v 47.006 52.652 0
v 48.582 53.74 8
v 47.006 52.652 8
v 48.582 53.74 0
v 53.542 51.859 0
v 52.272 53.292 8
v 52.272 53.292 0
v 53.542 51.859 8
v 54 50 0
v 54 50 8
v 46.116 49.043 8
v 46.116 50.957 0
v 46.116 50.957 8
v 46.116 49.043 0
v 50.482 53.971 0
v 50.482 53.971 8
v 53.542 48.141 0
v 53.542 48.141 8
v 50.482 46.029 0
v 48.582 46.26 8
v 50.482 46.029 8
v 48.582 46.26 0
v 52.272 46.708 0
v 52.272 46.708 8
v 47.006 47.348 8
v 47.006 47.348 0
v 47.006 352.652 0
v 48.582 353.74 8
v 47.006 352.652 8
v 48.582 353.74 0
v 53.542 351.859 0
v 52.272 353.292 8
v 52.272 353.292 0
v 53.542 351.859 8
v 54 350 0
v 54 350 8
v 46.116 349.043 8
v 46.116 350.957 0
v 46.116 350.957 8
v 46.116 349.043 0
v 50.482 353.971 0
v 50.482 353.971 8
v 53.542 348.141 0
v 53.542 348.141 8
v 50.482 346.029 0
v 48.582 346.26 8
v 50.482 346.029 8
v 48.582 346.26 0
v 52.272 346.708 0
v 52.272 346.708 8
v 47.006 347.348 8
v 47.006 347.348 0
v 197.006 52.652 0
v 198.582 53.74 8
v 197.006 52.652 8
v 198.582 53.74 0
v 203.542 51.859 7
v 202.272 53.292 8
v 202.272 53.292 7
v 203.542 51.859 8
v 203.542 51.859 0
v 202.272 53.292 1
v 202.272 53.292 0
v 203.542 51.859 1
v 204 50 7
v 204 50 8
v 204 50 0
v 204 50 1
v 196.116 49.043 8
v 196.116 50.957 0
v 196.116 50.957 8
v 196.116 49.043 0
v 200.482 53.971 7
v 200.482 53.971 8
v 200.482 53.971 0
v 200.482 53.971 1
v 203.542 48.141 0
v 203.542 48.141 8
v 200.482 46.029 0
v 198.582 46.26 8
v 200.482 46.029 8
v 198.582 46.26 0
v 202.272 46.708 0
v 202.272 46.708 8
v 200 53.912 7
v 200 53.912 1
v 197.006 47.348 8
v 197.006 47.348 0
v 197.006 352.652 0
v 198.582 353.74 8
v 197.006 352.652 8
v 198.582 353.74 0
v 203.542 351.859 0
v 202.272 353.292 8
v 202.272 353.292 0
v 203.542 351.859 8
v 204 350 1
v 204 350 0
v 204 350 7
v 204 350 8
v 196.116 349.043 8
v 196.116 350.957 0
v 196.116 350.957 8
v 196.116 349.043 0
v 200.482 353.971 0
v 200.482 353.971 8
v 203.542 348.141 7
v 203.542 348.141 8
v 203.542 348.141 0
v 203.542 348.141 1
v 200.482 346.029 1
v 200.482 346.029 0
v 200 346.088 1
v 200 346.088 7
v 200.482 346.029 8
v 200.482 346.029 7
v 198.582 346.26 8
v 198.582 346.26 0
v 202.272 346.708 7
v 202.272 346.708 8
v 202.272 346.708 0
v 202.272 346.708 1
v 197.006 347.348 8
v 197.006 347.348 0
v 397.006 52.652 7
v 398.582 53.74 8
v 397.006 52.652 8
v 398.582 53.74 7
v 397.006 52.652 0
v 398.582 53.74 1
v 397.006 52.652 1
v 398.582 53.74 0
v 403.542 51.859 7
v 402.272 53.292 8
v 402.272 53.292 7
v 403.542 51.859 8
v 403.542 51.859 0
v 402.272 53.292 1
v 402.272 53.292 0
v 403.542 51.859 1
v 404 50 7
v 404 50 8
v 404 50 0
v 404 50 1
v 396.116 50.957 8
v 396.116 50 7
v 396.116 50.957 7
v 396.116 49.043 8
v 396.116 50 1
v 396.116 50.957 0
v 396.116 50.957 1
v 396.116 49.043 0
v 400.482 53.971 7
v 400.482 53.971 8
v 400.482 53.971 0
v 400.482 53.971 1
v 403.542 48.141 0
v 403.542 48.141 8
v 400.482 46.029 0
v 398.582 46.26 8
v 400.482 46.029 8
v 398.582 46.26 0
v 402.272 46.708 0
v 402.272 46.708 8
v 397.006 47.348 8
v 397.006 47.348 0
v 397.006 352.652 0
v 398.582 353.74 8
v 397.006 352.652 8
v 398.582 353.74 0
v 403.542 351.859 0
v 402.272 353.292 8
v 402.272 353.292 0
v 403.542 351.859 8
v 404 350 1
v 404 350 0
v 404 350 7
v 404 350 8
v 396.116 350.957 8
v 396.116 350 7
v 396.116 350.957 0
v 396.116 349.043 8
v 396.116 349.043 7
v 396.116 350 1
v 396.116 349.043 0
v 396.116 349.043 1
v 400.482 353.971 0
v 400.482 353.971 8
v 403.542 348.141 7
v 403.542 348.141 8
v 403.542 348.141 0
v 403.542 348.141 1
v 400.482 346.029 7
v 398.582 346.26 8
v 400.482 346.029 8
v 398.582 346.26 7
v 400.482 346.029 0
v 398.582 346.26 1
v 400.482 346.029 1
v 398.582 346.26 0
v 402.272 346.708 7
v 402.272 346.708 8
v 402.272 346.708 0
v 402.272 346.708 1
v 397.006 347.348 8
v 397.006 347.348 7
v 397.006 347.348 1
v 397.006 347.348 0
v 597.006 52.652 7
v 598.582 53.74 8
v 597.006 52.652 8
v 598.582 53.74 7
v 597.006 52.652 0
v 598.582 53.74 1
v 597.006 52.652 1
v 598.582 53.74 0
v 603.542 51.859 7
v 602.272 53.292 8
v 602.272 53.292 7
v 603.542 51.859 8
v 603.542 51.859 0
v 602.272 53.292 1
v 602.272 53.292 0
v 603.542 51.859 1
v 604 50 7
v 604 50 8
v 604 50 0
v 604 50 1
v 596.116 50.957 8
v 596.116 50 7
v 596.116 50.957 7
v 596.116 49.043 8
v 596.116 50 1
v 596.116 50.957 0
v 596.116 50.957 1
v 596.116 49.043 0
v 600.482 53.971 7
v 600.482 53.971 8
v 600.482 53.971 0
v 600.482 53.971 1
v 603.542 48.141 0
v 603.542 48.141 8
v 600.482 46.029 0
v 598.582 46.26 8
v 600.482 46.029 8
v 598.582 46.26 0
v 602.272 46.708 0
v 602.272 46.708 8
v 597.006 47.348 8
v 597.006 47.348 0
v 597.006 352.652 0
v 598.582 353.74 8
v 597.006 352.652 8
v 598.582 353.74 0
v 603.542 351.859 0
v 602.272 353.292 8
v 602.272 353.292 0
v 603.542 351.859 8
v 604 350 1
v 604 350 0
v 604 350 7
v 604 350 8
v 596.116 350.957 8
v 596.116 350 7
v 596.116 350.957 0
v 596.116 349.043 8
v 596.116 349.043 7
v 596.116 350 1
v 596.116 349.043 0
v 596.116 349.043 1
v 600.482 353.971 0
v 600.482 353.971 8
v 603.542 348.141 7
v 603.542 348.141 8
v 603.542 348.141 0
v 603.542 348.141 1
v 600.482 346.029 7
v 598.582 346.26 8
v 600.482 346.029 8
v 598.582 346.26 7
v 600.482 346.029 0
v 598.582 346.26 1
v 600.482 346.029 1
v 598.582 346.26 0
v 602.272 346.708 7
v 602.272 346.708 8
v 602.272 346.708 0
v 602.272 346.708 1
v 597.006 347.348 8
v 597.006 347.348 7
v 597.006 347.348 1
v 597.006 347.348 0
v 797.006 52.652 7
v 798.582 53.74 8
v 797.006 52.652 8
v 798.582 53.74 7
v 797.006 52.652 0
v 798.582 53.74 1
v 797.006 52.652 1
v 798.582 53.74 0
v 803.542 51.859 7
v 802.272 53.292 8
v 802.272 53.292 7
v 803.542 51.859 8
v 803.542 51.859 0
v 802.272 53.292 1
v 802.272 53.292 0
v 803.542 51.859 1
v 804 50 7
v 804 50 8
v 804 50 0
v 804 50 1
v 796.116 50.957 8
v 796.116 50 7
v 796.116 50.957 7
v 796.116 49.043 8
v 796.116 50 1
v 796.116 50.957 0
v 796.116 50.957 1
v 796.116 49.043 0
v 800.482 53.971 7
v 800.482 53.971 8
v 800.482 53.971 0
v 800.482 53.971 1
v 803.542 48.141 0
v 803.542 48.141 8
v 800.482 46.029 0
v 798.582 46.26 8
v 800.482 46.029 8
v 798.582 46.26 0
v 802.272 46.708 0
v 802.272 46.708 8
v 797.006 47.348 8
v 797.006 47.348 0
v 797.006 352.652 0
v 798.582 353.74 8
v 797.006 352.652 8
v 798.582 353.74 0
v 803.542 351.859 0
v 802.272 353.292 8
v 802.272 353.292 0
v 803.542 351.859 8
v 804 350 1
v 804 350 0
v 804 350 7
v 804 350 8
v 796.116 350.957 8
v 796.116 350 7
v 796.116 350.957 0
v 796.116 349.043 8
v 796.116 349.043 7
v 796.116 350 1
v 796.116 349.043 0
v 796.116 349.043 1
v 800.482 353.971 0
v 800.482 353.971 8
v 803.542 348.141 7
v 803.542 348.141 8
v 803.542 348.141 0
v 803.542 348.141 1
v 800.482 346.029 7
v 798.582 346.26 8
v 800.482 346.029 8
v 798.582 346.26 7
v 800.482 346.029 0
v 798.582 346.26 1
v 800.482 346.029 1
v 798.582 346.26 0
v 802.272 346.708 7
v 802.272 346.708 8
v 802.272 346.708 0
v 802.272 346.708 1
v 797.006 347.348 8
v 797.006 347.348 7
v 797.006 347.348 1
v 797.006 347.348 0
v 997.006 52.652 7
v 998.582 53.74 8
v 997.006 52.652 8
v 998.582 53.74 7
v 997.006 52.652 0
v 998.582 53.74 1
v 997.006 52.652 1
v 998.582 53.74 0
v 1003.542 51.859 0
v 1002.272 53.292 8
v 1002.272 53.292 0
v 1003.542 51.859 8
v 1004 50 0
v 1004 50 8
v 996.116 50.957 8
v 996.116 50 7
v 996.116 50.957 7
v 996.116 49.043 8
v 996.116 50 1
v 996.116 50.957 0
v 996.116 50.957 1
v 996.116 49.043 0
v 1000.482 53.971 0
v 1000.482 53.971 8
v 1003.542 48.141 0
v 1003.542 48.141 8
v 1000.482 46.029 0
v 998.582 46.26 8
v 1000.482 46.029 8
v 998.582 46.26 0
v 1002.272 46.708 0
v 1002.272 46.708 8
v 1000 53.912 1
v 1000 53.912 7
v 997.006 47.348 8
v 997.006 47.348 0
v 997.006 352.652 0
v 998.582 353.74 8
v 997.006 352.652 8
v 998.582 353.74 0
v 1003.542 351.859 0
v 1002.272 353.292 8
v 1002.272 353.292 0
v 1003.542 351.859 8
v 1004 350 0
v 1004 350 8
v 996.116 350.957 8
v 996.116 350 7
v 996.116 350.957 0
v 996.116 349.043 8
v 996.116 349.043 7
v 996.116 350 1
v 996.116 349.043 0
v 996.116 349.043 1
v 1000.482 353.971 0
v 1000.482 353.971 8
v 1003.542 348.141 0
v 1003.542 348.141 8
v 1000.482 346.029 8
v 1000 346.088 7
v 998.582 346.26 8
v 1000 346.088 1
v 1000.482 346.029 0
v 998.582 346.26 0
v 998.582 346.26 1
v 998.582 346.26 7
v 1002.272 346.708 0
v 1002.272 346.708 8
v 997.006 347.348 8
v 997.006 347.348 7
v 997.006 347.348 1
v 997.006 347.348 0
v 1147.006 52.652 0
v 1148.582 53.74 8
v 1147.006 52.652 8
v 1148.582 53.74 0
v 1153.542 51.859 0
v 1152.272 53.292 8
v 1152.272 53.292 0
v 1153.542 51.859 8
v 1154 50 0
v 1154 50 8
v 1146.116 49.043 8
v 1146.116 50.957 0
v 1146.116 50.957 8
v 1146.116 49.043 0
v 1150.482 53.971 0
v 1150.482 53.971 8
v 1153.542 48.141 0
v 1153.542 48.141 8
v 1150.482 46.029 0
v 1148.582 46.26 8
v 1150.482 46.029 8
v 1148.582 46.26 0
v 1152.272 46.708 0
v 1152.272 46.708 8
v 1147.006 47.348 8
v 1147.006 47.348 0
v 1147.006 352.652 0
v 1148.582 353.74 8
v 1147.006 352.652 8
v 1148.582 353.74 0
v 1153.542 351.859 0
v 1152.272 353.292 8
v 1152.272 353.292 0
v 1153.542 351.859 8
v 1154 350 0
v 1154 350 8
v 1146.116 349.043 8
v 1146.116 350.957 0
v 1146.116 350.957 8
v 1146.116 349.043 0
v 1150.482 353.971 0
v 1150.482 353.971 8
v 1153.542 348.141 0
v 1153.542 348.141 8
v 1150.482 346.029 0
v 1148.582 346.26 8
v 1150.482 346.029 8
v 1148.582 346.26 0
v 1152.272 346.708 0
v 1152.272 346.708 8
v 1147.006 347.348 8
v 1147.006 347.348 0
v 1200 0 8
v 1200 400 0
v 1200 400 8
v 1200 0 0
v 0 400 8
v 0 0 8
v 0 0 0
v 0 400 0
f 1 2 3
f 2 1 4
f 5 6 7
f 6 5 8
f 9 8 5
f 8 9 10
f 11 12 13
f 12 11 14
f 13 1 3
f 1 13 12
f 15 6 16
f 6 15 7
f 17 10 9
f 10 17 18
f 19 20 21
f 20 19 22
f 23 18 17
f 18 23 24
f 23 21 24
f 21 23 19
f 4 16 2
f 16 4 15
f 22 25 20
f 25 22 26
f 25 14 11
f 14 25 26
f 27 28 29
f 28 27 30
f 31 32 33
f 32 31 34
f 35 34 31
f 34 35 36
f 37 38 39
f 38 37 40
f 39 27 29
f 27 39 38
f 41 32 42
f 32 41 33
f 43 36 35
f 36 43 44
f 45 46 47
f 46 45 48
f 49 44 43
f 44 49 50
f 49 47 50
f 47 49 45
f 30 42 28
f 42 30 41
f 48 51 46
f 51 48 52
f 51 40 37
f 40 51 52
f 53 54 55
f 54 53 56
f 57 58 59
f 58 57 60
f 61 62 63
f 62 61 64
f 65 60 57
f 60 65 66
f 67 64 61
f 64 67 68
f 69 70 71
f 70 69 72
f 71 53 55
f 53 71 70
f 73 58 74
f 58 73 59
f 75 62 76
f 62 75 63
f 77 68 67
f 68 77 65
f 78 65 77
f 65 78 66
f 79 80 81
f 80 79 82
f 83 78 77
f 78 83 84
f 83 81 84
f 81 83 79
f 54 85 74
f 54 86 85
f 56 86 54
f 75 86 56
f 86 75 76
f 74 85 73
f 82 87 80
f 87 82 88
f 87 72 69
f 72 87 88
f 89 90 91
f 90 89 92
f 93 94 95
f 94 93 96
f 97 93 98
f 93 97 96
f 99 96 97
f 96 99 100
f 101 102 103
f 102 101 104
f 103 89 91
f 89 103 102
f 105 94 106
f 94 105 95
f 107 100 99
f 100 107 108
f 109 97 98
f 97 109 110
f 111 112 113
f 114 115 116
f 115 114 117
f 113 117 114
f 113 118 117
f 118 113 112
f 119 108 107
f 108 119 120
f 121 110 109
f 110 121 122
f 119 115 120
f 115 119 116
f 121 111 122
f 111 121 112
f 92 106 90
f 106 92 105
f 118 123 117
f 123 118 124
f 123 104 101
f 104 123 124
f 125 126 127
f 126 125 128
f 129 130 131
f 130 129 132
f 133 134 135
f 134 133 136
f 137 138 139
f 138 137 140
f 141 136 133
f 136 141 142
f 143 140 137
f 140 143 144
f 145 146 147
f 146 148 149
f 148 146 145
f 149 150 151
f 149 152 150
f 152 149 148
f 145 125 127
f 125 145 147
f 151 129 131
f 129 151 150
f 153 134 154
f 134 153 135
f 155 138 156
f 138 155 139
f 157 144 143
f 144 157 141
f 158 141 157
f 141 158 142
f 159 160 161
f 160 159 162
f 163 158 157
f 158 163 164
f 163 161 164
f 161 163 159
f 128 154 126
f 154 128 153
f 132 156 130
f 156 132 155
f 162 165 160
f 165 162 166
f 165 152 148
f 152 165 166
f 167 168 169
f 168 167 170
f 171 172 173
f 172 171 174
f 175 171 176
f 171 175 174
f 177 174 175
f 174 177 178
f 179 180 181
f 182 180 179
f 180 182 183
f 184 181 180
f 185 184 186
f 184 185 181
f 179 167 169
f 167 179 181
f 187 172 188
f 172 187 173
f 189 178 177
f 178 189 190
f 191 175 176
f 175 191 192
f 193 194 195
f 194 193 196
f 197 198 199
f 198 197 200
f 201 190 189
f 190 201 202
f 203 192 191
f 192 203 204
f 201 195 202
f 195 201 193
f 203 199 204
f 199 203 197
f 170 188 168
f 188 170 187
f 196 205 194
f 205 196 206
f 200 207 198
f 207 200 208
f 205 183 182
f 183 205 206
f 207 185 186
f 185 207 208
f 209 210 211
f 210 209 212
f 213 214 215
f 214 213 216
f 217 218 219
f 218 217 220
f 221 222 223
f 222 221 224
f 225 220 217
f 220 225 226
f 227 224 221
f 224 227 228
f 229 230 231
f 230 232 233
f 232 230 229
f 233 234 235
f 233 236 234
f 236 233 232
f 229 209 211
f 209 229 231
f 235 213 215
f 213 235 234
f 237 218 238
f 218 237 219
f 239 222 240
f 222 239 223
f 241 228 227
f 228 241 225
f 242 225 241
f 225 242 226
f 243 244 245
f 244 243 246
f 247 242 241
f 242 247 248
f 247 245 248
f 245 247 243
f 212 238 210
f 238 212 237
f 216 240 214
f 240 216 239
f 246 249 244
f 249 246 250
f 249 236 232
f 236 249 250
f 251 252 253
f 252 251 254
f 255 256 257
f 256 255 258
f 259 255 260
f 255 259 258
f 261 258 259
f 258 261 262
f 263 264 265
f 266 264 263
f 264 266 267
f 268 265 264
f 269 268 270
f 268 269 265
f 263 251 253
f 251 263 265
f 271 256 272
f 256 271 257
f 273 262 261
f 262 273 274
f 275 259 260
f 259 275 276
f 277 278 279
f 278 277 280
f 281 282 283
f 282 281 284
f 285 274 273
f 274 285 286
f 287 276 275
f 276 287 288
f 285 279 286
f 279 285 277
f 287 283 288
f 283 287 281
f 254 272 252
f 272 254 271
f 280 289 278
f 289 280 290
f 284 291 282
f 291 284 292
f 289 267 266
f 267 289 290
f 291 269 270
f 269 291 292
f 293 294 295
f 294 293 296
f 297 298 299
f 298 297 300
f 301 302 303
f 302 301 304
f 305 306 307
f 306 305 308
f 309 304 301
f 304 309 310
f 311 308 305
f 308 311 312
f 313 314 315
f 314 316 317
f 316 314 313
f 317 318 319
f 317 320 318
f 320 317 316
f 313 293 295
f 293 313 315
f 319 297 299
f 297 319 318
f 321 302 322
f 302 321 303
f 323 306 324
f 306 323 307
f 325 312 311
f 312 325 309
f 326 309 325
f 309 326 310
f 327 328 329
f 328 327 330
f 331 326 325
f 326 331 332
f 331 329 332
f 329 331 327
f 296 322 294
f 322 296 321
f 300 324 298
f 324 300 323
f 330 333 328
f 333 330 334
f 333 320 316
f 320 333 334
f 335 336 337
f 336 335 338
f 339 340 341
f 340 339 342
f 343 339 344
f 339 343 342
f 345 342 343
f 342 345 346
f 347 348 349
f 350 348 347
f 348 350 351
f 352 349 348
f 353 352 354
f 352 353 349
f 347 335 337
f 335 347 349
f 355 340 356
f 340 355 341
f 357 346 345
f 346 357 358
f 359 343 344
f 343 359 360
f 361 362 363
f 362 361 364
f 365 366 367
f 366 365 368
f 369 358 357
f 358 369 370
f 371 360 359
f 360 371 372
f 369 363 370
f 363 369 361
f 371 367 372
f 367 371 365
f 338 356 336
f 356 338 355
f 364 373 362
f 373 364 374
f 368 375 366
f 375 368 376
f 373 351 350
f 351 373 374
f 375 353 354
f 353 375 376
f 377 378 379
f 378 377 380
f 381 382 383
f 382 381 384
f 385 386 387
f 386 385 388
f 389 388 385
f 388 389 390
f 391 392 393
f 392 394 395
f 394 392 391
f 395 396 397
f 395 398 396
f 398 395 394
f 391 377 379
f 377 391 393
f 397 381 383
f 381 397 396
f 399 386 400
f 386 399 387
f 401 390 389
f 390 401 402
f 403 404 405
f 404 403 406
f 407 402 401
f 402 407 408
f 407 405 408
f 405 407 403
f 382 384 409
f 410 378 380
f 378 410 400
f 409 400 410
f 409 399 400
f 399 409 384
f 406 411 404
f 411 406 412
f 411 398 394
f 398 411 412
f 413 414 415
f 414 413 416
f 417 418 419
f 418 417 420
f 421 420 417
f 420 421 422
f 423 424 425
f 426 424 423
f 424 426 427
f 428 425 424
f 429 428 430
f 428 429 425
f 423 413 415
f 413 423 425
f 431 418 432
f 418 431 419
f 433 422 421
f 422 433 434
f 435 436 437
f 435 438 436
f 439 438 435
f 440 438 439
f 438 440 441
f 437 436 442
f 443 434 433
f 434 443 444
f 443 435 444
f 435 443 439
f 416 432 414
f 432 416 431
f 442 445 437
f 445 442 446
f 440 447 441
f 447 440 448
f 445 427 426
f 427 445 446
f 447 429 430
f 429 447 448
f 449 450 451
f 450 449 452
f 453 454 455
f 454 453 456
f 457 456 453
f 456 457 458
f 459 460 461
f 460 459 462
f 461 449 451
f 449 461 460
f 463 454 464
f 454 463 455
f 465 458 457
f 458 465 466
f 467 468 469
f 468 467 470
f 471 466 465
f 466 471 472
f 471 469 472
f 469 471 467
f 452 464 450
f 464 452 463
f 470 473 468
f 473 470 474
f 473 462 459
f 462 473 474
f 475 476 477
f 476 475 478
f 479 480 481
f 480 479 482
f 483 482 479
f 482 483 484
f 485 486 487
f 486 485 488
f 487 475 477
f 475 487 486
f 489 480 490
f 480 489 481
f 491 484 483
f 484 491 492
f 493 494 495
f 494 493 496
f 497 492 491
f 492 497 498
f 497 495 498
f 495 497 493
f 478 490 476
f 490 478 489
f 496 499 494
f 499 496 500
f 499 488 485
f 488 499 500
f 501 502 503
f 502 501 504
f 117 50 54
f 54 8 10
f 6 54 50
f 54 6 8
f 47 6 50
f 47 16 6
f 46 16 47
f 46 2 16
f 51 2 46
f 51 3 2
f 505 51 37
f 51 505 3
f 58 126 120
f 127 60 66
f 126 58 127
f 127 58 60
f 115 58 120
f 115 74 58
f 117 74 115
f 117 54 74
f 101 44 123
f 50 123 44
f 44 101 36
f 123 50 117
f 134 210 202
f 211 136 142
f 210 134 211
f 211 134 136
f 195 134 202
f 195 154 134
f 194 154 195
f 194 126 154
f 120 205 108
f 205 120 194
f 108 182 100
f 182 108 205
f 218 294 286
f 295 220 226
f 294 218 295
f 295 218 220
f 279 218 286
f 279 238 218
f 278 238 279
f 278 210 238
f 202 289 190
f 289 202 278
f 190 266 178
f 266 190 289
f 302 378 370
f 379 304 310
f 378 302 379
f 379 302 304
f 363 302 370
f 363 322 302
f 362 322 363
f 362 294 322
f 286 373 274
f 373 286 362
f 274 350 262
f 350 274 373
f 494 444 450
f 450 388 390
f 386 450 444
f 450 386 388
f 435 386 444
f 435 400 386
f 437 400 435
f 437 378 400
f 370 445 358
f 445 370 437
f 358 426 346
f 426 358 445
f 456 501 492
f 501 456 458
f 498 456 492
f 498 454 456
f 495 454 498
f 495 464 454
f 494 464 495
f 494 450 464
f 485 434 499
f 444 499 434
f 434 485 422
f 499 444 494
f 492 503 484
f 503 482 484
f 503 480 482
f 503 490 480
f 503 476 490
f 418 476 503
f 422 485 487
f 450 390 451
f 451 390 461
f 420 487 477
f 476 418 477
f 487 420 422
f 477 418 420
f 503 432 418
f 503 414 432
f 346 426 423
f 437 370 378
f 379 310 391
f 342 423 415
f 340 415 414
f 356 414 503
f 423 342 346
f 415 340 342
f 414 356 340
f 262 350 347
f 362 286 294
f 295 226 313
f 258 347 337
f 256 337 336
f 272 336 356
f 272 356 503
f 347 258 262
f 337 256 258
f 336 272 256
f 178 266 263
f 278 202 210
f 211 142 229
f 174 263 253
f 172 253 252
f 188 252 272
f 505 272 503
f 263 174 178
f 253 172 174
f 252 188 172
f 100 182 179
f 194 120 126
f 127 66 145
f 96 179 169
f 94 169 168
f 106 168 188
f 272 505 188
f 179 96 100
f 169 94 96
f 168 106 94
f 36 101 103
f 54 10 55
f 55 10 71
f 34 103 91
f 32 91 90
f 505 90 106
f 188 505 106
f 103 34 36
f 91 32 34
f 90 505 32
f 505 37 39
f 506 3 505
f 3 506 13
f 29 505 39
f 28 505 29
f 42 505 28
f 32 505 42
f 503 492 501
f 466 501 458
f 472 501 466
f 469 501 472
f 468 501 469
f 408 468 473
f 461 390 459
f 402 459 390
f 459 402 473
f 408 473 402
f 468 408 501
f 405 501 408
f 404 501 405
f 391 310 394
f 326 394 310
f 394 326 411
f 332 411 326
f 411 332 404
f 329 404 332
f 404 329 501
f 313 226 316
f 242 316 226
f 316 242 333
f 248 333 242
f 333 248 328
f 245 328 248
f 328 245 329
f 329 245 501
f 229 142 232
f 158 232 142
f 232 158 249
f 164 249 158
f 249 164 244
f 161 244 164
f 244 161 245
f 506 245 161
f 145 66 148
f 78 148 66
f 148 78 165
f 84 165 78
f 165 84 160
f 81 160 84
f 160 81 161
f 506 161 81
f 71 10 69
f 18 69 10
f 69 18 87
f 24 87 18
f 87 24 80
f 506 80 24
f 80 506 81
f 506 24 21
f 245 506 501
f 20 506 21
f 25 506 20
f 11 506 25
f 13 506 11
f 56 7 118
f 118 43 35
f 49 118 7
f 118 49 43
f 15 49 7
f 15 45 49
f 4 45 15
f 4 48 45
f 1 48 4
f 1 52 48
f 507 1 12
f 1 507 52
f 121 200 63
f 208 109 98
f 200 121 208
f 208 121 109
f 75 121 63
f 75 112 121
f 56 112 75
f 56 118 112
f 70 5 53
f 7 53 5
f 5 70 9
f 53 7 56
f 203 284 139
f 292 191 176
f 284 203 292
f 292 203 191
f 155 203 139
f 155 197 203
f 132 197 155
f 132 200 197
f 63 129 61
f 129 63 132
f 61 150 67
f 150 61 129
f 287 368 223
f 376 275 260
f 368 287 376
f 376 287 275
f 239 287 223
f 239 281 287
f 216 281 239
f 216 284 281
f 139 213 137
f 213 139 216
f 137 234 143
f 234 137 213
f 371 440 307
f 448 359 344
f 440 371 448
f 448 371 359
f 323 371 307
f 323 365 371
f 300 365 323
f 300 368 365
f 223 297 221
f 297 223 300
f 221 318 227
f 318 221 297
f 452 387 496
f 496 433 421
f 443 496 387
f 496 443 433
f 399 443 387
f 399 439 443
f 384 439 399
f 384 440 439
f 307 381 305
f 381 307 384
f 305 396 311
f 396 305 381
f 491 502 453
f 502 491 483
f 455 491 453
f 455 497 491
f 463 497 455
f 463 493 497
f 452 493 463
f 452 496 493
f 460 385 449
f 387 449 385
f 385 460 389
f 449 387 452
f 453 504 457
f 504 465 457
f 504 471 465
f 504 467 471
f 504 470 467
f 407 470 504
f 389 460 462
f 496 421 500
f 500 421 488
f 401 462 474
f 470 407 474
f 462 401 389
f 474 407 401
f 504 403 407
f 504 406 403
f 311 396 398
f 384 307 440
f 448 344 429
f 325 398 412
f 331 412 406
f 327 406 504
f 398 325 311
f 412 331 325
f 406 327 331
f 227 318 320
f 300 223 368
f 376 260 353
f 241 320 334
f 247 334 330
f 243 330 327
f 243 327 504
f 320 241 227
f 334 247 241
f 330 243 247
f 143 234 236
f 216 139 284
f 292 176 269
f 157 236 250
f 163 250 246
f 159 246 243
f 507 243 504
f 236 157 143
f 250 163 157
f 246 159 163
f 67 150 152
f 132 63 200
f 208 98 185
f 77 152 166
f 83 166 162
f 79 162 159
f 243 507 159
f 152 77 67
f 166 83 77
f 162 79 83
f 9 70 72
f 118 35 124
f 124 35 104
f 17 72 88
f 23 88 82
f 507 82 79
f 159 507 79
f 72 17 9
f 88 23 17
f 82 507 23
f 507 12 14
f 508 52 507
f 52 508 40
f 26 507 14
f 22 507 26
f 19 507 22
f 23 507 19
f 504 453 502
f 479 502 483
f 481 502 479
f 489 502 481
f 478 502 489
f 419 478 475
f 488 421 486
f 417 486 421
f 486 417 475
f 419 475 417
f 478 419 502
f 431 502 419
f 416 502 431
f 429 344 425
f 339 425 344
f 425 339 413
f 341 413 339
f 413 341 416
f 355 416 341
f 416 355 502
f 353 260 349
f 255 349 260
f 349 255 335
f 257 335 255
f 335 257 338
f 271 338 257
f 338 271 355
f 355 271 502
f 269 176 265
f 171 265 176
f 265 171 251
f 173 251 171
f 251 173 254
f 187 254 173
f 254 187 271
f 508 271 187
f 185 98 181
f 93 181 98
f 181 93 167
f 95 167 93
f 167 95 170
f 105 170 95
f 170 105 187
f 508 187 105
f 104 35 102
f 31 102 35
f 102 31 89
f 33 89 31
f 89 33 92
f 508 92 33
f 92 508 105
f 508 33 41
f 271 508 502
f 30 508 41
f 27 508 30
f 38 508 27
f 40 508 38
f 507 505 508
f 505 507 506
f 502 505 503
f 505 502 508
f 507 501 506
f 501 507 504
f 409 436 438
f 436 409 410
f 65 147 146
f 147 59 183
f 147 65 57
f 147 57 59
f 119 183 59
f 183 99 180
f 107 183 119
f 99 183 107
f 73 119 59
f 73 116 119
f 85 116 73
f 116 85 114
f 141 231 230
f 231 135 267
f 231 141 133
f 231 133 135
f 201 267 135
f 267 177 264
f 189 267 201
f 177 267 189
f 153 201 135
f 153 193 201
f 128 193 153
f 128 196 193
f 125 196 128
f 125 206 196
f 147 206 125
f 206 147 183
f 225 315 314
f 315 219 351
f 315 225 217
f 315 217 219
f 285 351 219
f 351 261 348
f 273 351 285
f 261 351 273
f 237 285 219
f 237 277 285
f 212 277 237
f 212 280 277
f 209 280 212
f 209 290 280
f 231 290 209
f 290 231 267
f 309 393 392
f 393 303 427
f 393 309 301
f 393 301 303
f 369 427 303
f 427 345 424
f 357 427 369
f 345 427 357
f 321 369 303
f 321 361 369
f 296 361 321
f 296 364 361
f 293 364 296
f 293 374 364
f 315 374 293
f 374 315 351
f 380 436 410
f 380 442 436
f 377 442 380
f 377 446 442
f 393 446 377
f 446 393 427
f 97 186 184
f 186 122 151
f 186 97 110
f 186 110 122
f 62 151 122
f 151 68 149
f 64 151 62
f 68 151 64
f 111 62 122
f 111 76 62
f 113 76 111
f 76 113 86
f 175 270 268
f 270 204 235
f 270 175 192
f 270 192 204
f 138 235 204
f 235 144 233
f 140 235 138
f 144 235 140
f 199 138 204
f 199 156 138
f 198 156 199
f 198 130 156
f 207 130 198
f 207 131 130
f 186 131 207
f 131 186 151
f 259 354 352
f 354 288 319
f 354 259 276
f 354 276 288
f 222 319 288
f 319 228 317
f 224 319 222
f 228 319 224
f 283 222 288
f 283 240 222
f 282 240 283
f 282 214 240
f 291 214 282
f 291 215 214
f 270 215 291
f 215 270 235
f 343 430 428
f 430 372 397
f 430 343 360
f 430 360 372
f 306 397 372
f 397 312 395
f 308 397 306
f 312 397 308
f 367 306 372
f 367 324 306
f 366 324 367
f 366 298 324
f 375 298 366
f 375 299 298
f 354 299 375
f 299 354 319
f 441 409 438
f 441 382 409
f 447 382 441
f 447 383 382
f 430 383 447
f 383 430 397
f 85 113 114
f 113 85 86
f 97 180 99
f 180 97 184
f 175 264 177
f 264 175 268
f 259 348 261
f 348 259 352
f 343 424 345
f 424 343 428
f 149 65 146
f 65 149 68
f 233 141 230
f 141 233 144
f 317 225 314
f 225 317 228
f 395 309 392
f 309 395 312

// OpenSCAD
// 🛴 Urban Lab Scooter - Telaio
// Modello OpenSCAD per stampa 3D

// Parametri
length = 1200;  // mm
width = 400;    // mm
thickness = 8;  // mm
hole_diameter = 8; // mm per bulloni

// Telaio principale
module telaio() {
    difference() {
        // Piattaforma principale
        cube([length, width, thickness]);
        
        // Fori per bulloni (8 posizioni)
        for (x = [50, 200, 400, 600, 800, 1000, 1150]) {
            for (y = [50, 350]) {
                translate([x, y, -1])
                    cylinder(h = thickness + 2, r = hole_diameter/2);
            }
        }
        
        // Alleggerimento centrale
        translate([200, 50, 1])
            cube([800, 300, thickness - 2]);
    }
}

// Render
telaio();
